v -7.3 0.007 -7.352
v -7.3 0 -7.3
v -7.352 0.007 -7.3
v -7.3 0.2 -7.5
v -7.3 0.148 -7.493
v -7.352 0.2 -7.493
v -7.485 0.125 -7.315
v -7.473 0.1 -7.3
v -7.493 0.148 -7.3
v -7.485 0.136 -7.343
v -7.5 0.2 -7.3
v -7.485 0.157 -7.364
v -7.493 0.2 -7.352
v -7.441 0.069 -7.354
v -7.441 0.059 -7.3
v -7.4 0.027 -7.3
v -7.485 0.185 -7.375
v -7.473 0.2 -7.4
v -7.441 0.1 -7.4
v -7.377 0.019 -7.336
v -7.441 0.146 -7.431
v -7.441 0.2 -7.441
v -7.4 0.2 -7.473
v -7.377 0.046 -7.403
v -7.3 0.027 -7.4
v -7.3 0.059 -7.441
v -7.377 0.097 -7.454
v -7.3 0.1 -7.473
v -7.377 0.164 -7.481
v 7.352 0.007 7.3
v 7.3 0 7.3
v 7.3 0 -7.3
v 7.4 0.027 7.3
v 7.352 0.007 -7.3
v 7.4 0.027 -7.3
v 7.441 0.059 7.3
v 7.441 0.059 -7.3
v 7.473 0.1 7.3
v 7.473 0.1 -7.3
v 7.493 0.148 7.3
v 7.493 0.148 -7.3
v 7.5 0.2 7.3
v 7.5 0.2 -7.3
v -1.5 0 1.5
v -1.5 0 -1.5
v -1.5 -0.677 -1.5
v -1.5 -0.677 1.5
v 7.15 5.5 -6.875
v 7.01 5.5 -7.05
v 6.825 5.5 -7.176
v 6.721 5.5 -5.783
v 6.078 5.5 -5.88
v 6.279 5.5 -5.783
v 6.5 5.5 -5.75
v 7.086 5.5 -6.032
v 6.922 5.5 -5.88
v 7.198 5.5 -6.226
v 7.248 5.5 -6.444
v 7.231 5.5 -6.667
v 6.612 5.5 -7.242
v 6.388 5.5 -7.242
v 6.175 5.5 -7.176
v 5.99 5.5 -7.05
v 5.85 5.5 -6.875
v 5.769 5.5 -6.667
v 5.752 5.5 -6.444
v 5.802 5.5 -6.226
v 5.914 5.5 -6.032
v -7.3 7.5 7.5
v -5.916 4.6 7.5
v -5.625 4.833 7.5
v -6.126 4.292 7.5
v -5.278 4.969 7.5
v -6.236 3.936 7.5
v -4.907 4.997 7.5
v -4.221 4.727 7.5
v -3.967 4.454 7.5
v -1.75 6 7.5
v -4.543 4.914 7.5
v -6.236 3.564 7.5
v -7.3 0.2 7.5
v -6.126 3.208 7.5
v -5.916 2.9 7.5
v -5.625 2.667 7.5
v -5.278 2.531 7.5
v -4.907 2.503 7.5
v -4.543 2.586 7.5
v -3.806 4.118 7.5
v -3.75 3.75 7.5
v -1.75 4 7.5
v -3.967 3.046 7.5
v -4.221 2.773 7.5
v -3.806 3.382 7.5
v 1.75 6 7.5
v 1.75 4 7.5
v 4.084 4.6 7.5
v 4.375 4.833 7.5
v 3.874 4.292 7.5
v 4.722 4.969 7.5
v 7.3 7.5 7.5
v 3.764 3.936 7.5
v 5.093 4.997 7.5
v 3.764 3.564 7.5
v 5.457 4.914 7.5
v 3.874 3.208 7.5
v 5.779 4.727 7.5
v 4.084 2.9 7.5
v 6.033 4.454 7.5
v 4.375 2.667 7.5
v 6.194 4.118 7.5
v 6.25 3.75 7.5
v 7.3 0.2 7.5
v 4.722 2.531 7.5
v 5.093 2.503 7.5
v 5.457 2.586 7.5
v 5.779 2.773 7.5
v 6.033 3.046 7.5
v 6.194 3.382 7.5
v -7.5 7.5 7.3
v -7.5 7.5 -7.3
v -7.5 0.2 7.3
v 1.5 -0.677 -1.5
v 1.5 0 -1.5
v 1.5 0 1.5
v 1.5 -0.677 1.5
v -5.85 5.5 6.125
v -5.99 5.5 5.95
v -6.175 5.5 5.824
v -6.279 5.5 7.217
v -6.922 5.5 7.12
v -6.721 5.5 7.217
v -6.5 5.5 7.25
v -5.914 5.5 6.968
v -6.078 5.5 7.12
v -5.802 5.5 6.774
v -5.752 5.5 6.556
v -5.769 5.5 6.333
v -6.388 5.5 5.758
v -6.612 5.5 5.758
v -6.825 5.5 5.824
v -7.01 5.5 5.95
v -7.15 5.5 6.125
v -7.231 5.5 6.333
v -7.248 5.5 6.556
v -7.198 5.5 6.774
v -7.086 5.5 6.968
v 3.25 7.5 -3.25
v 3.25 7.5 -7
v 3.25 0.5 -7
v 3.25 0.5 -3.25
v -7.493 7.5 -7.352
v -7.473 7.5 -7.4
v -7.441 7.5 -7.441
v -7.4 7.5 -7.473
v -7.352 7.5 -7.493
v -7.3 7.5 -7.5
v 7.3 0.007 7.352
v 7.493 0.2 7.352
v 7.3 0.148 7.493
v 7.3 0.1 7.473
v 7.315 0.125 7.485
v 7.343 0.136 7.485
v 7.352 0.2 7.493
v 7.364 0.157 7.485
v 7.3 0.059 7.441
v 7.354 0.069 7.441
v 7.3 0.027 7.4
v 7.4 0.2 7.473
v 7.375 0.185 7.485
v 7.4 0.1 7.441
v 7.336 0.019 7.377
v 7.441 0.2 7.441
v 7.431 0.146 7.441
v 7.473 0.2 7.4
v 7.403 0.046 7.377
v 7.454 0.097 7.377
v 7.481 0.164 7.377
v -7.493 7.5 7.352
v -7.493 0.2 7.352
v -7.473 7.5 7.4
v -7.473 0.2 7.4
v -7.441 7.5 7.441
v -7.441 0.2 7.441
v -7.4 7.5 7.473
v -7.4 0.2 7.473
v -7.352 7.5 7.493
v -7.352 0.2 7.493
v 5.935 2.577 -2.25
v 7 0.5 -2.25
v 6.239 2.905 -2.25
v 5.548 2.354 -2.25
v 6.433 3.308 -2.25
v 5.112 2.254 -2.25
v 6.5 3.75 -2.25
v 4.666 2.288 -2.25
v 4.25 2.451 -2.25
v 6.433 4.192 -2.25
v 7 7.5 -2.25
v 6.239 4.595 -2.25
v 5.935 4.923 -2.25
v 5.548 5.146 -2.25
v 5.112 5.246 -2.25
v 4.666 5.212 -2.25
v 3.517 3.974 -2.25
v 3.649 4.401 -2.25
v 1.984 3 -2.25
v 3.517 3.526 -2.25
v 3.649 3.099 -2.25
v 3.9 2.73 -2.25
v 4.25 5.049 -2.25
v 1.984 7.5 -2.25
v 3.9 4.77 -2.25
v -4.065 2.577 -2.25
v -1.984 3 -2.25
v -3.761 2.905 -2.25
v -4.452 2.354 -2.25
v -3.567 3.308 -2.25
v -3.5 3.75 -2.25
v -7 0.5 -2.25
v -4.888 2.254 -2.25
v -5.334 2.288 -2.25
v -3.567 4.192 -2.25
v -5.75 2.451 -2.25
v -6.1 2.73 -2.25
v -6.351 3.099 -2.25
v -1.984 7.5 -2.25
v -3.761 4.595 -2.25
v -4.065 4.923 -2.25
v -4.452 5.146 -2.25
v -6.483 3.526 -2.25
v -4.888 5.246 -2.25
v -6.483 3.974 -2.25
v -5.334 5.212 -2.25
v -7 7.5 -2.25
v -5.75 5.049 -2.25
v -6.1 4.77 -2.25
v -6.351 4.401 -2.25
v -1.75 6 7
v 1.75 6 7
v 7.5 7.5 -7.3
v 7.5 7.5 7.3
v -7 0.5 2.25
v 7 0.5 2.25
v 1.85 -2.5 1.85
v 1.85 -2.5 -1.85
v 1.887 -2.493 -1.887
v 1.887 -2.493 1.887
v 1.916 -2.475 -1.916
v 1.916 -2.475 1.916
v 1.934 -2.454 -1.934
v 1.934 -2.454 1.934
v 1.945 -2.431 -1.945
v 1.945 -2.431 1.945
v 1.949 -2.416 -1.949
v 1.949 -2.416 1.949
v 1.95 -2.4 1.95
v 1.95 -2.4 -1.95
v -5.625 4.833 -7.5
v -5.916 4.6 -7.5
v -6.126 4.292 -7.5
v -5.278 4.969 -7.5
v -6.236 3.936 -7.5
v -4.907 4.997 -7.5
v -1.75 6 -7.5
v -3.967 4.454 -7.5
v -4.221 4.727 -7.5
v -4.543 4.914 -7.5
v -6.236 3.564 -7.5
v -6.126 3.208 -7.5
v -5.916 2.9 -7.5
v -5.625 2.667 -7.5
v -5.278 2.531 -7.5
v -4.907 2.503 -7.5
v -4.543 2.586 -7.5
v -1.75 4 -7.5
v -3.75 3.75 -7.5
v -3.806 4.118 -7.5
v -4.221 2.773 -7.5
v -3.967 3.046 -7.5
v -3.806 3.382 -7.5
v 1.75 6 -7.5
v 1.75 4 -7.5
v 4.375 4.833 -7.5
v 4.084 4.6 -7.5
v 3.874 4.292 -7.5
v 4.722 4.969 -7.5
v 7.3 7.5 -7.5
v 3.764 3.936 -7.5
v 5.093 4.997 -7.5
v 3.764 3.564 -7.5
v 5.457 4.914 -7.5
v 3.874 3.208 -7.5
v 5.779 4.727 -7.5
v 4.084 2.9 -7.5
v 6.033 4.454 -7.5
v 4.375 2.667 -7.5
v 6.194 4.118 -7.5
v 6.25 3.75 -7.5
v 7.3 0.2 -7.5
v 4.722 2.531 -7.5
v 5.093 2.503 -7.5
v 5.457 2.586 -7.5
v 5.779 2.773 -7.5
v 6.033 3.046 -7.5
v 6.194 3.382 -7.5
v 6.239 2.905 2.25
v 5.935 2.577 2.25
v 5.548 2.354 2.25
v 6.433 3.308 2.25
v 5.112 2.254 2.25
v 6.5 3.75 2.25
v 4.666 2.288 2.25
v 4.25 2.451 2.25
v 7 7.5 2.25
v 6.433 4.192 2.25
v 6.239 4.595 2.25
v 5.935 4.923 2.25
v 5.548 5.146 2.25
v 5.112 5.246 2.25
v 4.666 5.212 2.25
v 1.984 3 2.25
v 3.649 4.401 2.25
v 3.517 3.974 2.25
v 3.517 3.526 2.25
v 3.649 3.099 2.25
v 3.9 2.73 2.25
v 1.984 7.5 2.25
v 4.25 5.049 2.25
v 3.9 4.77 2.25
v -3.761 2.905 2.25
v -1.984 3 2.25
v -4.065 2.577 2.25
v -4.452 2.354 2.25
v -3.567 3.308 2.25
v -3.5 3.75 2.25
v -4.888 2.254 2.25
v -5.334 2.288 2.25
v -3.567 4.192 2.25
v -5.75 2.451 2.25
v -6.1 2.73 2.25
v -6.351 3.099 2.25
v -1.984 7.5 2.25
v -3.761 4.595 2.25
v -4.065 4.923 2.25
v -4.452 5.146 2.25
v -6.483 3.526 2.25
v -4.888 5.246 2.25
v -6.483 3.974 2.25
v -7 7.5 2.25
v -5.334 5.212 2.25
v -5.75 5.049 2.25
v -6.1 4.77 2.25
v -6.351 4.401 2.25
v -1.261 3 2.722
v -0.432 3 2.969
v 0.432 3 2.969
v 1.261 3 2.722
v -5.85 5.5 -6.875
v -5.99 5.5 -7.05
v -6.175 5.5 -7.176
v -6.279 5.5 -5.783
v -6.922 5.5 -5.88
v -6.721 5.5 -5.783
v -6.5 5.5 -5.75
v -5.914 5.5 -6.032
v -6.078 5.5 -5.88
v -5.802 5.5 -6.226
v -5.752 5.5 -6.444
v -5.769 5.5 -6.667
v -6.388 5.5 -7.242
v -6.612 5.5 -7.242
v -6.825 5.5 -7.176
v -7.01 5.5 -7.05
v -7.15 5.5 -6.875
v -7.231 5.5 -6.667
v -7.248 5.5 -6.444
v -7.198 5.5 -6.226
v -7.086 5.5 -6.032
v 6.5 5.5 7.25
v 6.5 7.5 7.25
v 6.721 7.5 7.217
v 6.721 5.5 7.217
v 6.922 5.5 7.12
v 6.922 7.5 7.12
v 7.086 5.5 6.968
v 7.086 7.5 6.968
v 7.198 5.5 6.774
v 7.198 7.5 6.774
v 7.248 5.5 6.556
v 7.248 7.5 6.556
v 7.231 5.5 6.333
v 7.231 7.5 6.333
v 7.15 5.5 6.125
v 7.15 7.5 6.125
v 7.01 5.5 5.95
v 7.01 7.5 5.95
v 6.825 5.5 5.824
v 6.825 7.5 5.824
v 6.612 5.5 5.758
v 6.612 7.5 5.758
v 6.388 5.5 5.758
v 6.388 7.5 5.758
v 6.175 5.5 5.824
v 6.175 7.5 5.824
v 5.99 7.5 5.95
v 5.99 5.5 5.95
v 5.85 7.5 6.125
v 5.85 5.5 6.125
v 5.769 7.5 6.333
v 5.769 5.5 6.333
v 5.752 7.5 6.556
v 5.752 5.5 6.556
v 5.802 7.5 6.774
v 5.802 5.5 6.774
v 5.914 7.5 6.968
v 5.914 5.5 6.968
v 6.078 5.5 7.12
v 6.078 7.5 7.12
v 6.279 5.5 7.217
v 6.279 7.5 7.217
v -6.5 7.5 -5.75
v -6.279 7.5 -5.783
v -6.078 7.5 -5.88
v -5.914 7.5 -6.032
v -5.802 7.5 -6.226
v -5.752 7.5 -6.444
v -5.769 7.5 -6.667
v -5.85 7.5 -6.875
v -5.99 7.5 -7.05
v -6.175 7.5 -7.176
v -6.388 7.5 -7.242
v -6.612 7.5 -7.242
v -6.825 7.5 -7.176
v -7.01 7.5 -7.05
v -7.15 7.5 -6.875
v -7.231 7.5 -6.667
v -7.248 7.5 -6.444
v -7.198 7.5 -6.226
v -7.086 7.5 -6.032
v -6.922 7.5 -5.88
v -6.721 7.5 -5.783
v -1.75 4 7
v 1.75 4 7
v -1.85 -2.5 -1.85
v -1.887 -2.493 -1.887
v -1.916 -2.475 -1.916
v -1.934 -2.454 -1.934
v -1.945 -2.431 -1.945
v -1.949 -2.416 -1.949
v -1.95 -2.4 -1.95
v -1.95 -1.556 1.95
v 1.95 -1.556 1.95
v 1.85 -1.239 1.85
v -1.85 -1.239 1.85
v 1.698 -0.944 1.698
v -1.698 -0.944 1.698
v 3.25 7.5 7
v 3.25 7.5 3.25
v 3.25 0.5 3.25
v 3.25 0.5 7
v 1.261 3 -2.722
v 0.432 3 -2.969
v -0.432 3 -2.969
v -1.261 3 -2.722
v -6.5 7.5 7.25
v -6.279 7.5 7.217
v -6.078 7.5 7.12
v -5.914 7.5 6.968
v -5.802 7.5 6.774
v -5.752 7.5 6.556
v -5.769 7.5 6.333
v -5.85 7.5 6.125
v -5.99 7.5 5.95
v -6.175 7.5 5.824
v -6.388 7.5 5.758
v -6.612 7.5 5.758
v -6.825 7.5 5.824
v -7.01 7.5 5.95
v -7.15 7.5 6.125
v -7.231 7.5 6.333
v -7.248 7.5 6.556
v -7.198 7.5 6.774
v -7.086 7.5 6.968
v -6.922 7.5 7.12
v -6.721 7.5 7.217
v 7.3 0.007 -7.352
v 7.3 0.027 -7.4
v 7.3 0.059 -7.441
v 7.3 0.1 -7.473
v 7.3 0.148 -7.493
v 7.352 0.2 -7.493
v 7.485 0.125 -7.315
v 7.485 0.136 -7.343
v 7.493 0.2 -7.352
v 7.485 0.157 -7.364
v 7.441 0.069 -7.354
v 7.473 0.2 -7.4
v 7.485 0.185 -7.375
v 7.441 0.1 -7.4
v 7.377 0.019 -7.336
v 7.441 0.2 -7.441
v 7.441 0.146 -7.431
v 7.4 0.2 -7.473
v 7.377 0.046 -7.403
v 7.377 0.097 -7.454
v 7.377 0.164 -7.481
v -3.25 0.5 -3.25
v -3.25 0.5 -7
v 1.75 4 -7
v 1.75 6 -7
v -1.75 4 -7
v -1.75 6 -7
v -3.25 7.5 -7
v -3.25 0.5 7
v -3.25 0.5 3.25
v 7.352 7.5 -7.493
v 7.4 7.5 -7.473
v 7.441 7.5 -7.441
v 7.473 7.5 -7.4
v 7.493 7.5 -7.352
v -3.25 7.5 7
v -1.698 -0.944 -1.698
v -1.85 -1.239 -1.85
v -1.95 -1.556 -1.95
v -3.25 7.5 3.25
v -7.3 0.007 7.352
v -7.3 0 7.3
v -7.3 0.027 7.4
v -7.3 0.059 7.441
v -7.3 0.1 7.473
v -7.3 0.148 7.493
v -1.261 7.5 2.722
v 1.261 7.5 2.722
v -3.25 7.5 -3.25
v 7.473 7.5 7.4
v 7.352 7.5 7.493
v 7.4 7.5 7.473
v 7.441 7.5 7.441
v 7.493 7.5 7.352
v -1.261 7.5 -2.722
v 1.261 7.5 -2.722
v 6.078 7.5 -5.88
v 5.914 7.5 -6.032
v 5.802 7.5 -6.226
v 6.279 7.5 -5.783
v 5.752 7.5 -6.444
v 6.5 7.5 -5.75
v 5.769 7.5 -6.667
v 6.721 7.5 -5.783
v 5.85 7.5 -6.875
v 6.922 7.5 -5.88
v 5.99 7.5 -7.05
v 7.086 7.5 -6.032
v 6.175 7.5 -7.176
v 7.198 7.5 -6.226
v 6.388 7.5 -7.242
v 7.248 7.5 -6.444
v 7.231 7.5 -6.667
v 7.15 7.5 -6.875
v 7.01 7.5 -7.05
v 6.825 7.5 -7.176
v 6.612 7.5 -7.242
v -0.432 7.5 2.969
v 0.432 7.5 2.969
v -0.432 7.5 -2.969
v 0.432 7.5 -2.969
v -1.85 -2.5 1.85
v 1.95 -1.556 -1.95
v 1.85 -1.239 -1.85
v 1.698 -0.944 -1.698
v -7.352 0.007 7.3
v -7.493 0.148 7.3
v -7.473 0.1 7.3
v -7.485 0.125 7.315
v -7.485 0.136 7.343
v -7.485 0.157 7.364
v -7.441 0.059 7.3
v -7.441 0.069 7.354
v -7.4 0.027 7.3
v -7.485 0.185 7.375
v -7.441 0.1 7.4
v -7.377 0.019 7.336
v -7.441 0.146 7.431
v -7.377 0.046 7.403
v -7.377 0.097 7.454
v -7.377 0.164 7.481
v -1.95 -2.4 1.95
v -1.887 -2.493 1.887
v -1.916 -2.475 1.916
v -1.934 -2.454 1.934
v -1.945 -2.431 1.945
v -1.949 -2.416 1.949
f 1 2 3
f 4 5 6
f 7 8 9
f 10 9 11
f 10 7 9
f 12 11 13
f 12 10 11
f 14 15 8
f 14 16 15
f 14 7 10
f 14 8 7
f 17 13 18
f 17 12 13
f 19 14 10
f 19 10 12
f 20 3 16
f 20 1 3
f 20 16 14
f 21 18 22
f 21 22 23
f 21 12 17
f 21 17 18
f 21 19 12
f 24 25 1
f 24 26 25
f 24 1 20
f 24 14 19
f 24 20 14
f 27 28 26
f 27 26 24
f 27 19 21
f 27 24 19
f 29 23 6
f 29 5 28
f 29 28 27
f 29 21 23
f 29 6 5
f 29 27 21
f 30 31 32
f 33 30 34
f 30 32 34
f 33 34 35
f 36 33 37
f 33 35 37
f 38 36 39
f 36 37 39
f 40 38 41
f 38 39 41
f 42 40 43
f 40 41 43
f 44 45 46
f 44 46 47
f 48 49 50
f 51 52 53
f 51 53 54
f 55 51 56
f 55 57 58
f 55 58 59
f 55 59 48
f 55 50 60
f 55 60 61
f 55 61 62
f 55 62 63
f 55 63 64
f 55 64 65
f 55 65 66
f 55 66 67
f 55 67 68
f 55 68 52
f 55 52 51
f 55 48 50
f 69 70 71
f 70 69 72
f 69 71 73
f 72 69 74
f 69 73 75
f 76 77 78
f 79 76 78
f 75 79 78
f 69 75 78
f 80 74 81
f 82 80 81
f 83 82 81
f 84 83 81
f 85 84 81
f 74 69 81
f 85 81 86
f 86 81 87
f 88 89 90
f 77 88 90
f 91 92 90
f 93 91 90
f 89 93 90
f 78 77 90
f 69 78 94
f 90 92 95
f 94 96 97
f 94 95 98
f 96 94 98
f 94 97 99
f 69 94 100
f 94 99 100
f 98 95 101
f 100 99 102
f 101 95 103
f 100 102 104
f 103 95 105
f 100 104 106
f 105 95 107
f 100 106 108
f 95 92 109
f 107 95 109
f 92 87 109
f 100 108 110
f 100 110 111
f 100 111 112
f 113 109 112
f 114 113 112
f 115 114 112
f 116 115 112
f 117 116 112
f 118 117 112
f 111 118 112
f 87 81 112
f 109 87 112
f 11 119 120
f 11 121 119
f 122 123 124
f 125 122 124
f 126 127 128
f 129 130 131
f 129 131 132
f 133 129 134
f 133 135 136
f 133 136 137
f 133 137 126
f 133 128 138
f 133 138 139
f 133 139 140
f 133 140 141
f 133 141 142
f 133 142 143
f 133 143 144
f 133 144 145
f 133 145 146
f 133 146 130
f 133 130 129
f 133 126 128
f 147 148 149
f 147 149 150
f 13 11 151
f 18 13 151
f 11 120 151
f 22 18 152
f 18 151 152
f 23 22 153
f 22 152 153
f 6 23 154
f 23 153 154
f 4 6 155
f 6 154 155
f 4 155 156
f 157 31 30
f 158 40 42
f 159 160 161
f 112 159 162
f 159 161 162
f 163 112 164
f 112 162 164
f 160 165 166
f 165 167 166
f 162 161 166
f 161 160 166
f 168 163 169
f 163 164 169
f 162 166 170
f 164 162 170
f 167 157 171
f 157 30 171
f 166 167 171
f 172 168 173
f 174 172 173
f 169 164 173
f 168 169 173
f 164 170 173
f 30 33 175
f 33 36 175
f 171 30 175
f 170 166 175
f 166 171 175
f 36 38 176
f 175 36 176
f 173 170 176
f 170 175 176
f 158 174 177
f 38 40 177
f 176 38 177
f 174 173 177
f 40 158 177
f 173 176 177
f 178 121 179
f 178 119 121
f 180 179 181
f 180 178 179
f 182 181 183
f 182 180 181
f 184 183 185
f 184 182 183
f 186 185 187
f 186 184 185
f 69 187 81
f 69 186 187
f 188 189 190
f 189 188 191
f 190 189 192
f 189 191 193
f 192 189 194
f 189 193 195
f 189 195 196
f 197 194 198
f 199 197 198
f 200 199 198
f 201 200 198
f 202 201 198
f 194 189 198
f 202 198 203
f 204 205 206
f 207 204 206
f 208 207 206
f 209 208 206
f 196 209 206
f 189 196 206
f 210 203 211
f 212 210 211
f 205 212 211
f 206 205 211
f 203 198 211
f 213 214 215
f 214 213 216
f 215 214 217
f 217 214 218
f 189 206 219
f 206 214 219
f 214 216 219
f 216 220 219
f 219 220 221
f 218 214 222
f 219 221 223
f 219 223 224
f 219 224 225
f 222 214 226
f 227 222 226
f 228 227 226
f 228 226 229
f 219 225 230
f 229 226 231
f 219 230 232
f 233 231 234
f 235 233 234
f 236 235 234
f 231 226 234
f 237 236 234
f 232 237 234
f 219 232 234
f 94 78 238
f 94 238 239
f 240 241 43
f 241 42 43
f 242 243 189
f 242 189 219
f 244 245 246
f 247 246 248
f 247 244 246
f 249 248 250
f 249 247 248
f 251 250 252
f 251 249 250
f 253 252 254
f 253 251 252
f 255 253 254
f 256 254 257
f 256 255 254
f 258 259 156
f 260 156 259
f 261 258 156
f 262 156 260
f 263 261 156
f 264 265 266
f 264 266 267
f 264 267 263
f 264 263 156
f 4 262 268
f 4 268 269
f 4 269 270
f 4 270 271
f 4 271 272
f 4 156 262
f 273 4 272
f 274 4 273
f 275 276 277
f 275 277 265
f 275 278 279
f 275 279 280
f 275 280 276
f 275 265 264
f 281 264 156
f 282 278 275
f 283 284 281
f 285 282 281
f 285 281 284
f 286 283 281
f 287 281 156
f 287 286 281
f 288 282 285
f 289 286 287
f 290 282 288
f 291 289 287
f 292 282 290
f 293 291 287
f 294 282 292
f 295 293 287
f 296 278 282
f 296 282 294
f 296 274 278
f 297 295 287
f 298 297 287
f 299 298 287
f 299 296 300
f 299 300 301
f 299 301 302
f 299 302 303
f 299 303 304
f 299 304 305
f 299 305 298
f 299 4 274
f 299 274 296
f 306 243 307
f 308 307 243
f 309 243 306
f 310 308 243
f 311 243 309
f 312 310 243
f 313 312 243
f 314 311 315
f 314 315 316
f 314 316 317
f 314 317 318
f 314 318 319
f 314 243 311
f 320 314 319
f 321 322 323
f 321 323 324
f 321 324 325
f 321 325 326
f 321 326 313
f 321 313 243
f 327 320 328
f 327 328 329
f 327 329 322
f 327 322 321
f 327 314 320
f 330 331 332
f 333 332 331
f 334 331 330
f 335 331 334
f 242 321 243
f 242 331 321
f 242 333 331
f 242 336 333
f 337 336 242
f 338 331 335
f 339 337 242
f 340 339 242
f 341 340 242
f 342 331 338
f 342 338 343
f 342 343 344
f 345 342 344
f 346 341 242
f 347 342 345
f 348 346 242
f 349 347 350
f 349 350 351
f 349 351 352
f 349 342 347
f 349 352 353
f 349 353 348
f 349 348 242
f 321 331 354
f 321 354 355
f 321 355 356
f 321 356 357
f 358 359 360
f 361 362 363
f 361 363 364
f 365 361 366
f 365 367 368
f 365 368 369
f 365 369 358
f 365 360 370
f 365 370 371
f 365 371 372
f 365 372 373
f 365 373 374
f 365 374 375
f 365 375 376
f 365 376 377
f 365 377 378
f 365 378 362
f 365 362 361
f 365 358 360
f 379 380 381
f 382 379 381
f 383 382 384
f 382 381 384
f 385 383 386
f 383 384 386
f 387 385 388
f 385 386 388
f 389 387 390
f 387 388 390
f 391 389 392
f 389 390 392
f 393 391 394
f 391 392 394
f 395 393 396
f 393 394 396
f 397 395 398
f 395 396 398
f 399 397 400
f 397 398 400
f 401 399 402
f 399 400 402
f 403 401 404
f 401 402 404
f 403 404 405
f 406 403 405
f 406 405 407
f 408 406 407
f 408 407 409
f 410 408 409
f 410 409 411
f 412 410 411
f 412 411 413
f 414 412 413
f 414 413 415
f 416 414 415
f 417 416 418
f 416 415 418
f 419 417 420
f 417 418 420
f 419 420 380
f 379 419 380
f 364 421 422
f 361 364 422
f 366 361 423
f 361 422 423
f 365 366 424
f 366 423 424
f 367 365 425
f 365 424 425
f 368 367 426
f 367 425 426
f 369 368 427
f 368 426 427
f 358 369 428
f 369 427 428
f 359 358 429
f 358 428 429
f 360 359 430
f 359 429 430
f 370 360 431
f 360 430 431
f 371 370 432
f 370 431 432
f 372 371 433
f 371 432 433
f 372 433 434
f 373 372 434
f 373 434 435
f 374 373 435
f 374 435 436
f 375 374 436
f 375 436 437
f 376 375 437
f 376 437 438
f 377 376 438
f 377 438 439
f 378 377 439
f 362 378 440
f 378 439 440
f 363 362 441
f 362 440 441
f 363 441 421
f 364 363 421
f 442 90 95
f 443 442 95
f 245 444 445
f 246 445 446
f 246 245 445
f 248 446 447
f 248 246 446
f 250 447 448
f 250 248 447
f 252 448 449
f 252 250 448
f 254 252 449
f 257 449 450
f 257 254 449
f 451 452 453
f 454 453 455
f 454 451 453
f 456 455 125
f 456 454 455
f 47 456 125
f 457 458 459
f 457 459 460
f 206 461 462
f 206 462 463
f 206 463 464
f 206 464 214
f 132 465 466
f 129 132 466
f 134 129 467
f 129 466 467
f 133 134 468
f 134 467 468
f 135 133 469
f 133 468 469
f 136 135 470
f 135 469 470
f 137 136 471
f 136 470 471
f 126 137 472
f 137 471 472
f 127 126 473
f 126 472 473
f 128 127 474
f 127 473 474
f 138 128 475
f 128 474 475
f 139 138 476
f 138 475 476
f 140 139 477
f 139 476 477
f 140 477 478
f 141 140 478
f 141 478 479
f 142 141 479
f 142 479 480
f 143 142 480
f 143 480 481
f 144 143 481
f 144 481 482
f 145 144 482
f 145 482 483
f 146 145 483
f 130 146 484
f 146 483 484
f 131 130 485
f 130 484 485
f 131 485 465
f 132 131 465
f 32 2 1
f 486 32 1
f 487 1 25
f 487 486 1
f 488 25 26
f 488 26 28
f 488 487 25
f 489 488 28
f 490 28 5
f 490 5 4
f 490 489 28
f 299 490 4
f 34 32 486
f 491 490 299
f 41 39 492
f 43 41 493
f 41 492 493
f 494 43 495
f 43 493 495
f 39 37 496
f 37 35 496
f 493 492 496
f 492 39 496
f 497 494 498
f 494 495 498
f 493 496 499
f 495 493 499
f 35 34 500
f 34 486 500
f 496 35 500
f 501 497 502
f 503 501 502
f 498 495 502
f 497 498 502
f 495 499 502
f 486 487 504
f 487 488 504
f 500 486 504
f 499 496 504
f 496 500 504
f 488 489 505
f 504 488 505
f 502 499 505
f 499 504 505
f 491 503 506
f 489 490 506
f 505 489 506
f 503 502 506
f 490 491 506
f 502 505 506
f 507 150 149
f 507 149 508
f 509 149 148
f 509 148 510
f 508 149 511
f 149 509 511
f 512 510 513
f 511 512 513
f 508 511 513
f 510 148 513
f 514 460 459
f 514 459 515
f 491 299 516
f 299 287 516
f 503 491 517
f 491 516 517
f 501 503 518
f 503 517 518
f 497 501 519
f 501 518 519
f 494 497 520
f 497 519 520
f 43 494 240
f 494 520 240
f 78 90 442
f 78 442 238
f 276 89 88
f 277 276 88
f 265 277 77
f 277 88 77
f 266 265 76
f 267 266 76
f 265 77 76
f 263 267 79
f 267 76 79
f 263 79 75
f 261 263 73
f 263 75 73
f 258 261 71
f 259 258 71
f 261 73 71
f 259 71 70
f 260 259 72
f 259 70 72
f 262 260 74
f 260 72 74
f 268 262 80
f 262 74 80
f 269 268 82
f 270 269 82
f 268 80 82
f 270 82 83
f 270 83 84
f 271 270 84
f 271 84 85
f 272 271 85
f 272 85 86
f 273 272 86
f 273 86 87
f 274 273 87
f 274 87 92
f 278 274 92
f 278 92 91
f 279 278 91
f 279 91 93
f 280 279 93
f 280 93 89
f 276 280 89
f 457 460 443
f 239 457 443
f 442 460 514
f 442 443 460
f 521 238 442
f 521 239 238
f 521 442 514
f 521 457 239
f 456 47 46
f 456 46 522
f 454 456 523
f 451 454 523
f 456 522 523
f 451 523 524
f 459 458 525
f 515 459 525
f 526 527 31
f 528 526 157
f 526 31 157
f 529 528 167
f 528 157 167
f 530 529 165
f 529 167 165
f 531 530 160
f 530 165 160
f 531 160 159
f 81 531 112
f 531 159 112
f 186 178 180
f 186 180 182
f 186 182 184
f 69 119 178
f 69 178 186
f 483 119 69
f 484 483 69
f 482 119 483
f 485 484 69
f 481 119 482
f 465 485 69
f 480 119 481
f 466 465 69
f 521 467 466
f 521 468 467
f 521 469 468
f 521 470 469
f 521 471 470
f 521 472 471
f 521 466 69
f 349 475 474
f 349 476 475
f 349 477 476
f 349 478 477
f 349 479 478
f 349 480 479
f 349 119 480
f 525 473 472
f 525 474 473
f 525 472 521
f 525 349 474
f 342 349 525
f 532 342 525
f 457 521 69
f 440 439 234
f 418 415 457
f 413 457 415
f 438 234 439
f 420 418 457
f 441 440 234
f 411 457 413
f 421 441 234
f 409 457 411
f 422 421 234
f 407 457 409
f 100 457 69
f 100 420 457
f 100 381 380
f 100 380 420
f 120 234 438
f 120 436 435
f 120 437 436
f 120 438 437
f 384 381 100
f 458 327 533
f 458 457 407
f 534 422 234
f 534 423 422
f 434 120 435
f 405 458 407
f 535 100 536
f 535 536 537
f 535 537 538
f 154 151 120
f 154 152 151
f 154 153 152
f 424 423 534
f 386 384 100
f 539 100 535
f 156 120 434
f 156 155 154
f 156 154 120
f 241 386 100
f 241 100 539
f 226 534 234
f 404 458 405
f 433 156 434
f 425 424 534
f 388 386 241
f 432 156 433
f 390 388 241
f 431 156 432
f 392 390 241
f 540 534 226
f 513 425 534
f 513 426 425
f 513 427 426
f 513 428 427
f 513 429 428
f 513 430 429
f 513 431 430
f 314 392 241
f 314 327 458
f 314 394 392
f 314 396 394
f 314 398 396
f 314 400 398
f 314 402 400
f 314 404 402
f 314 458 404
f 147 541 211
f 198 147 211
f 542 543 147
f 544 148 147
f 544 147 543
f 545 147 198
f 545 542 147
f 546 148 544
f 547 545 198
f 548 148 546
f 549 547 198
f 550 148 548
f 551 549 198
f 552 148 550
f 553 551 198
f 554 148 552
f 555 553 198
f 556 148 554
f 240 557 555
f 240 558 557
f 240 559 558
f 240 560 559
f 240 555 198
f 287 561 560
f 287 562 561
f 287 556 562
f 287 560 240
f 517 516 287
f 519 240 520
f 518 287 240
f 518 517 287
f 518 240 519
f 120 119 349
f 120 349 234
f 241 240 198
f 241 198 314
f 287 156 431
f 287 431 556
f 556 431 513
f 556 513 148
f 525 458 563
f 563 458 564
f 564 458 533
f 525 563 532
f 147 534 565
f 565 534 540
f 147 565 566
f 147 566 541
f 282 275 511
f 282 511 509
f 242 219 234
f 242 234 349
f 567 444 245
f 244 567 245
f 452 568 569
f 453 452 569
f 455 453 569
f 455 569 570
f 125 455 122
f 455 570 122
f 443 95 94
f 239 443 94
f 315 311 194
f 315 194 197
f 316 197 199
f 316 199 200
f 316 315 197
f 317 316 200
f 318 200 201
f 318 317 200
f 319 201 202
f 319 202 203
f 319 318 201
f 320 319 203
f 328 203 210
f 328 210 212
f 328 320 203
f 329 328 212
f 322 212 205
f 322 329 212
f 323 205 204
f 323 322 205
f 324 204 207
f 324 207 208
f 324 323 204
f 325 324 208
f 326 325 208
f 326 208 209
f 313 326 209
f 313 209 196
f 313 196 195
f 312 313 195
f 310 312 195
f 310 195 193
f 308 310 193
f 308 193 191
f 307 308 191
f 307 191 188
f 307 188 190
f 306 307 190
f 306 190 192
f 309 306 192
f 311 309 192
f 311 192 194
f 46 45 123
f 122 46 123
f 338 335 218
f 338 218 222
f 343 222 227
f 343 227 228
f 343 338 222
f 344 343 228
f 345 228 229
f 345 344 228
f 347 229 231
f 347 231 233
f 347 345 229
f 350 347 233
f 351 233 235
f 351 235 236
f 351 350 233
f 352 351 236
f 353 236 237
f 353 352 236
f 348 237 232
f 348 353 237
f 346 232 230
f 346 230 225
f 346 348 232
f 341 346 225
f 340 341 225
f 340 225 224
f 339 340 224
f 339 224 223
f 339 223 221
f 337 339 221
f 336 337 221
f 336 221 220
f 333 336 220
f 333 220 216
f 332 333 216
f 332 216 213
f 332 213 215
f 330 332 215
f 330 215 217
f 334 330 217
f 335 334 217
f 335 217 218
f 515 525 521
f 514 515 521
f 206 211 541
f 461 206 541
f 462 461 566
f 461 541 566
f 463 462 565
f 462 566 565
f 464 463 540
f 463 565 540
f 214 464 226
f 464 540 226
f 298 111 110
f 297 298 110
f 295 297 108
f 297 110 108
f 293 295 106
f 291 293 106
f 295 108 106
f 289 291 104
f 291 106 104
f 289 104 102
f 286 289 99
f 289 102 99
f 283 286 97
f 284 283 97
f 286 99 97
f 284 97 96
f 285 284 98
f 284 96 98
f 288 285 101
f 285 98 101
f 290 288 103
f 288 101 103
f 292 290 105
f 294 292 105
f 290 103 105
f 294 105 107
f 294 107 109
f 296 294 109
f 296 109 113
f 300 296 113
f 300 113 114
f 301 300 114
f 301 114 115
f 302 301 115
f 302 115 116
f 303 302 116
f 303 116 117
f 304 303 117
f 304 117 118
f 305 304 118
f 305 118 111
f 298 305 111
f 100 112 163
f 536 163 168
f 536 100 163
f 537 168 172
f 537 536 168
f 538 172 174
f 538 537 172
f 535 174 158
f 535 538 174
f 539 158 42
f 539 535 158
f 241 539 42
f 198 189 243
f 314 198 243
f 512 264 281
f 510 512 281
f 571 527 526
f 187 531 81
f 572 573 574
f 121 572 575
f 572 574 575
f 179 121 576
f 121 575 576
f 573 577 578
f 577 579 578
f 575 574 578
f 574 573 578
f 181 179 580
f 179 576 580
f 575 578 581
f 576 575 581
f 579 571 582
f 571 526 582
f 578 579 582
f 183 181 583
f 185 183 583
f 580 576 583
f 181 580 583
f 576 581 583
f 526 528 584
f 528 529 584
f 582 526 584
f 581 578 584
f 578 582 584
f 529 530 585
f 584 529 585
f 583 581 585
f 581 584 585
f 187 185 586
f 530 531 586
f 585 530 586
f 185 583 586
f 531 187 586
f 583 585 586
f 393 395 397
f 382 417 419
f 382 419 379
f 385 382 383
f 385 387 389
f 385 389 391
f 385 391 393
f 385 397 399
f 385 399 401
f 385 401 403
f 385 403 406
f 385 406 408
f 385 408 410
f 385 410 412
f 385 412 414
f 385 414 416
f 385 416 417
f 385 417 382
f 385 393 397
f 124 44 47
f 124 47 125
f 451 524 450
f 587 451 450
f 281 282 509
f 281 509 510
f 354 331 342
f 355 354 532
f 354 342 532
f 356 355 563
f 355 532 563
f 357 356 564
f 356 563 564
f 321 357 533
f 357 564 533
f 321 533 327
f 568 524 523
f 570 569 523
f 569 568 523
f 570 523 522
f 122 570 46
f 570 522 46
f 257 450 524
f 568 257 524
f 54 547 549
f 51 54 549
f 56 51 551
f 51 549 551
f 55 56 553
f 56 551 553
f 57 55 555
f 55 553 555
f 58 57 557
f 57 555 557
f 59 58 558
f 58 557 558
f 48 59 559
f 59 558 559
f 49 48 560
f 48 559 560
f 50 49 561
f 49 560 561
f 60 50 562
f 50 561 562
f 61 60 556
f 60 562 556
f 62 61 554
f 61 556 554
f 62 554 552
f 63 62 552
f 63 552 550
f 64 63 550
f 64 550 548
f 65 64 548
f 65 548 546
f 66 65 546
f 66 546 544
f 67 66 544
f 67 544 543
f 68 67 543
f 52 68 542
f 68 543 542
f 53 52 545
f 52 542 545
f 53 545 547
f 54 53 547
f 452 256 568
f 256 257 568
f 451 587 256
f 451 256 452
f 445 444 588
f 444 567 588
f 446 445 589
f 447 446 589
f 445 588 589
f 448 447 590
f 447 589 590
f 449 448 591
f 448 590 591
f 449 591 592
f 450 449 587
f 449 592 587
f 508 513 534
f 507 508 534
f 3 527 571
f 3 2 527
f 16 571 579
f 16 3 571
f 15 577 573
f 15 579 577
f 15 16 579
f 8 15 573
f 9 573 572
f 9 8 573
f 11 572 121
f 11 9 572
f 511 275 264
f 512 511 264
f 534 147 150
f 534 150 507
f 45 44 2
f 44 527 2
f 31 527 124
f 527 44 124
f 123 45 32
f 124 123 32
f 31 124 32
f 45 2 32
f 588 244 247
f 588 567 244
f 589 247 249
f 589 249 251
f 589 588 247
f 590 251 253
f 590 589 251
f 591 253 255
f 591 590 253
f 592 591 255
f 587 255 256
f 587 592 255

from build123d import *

# Parameters (mm, degrees)
SKETCH_2_W                      = 15
SKETCH_2_H                      = 15
EXTRUDE_1_DEPTH                 = 7.5
SKETCH_3_W                      = 14
SKETCH_3_H                      = 4.5
CUT_EXTRUDE_1_DEPTH             = 7
SKETCH_4_R                      = 3
CUT_EXTRUDE_2_DEPTH             = 4.5
SKETCH_5_W                      = 6.5
SKETCH_5_H                      = 3.75
CUT_EXTRUDE_3_DEPTH             = 7
EXTRUDE_2_REACH                 = 20.371
SKETCH_6_R                      = 1.5
SKETCH_7_R                      = 1.25
CUT_EXTRUDE_4_DEPTH             = 19.371173071
SKETCH_8_W                      = 3
SKETCH_8_H                      = 3
EXTRUDE_3_DEPTH                 = 1
CUT_EXTRUDE_5_REACH             = 20.371
SKETCH_9_W                      = 3.5
SKETCH_9_H                      = 2
CUT_EXTRUDE_6_REACH             = 35.371
CUT_EXTRUDE_START               = -15
SKETCH_9_2_W                    = 3.5
SKETCH_9_2_H                    = 2
EXTRUDE_4_DEPTH                 = 2
EXTRUDE_4_DEPTH_BACK            = 2
CUT_EXTRUDE_7_REACH             = 14.99
CUT_EXTRUDE_7_DIRECTION_2_REACH = 14.99
FILLET_1_R                      = 0.1
FILLET_2_R                      = 0.2
SKETCH_12_R                     = 0.75
CUT_EXTRUDE_8_DEPTH             = 2


with BuildPart() as part:
    # 草图2 → 凸台-拉伸1 (new body)
    with BuildSketch(Plane(origin=(0, 0, 0), x_dir=(1, 0, 0), z_dir=(0, 1, 0))):
        Rectangle(SKETCH_2_W, SKETCH_2_H)
    extrude(amount=EXTRUDE_1_DEPTH)

    # 草图3 → 切除-拉伸1 (cut)
    with BuildSketch(Plane(origin=(0, 7.5, 0), x_dir=(-1, 0, 0), z_dir=(0, 1, 0))):
        Rectangle(SKETCH_3_W, SKETCH_3_H)
    extrude(amount=-CUT_EXTRUDE_1_DEPTH, mode=Mode.SUBTRACT)

    # 草图4 → 切除-拉伸2 (cut)
    with BuildSketch(Plane(origin=(0, 7.5, 0), x_dir=(1, 0, 0), z_dir=(0, 1, 0))):
        Circle(SKETCH_4_R)
    extrude(amount=-CUT_EXTRUDE_2_DEPTH, mode=Mode.SUBTRACT)

    # 草图5 → 切除-拉伸3 (cut)
    with BuildSketch(Plane(origin=(0, 7.5, 0), x_dir=(-1, 0, 0), z_dir=(0, 1, 0))):
        with Locations((0, -5.125)):
            Rectangle(SKETCH_5_W, SKETCH_5_H)
        with Locations((0, 5.125)):
            Rectangle(SKETCH_5_W, SKETCH_5_H)
    extrude(amount=-CUT_EXTRUDE_3_DEPTH, mode=Mode.SUBTRACT)

    # 草图6 → 凸台-拉伸2 (add, up to next)
    with BuildSketch(Plane.XY.offset(7.5), mode=Mode.PRIVATE) as extrude_2_sk1:
        with Locations((-5, 3.75)):
            Circle(SKETCH_6_R)
    extrude_2_tool1 = extrude(extrude_2_sk1.sketch, amount=-EXTRUDE_2_REACH, mode=Mode.PRIVATE) - part.part
    # 草图6 → 凸台-拉伸2 (add, up to next)
    with BuildSketch(Plane.XY.offset(7.5), mode=Mode.PRIVATE) as extrude_2_sk2:
        with Locations((5, 3.75)):
            Circle(SKETCH_6_R)
    extrude_2_tool2 = extrude(extrude_2_sk2.sketch, amount=-EXTRUDE_2_REACH, mode=Mode.PRIVATE) - part.part
    add(extrude_2_tool1.solids().sort_by_distance((-5, 3.75, 7.5))[0])
    add(extrude_2_tool2.solids().sort_by_distance((5, 3.75, 7.5))[0])

    # 草图7 → 切除-拉伸4 (cut, through all)
    with BuildSketch(Plane.XY.offset(7.5)):
        with Locations((-5, 3.75)):
            Circle(SKETCH_7_R)
        with Locations((5, 3.75)):
            Circle(SKETCH_7_R)
    extrude(amount=-CUT_EXTRUDE_4_DEPTH, mode=Mode.SUBTRACT)

    # 草图8 → 凸台-拉伸3 (add)
    with BuildSketch(Plane.XZ):
        Rectangle(SKETCH_8_W, SKETCH_8_H)
    extrude(amount=EXTRUDE_3_DEPTH)

    # 草图9 → 切除-拉伸5 (cut, up to next)
    with BuildSketch(Plane.XY.offset(7.5), mode=Mode.PRIVATE) as cut_extrude_5_sk1:
        with Locations((0, 5)):
            Rectangle(SKETCH_9_W, SKETCH_9_H)
    cut_extrude_5_tool1 = extrude(cut_extrude_5_sk1.sketch, amount=-CUT_EXTRUDE_5_REACH, mode=Mode.PRIVATE) & part.part
    add(cut_extrude_5_tool1.solids().sort_by_distance((0, 5, 7.5))[0], mode=Mode.SUBTRACT)

    # 草图9<2> → 切除-拉伸6 (cut, up to next)
    with BuildSketch(Plane.XY.offset(7.5).offset(CUT_EXTRUDE_START), mode=Mode.PRIVATE) as cut_extrude_6_sk1:
        with Locations((0, 5)):
            Rectangle(SKETCH_9_2_W, SKETCH_9_2_H)
    cut_extrude_6_tool1 = extrude(cut_extrude_6_sk1.sketch, amount=CUT_EXTRUDE_6_REACH, mode=Mode.PRIVATE) & part.part
    add(cut_extrude_6_tool1.solids().sort_by_distance((0, 5, -7.5))[0], mode=Mode.SUBTRACT)

    # 草图10 → 凸台-拉伸4 (add, two sides: drawn at the far end of the back side and taken through both)
    with BuildSketch(Plane.XY.offset(-EXTRUDE_4_DEPTH_BACK)):
        with BuildLine():
            Line((-1.95, -2.5), (1.95, -2.5))
            Line((1.95, -2.5), (1.95, -1.555590279))
            ThreePointArc((1.95, -1.555590279), (1.780042303, -1.088161527), (1.5, -0.677124344))
            Line((1.5, -0.677124344), (-1.5, -0.677124344))
            ThreePointArc((-1.5, -0.677124344), (-1.780042303, -1.088161527), (-1.95, -1.555590279))
            Line((-1.95, -1.555590279), (-1.95, -2.5))
        make_face()
    extrude(amount=EXTRUDE_4_DEPTH + EXTRUDE_4_DEPTH_BACK)

    # 草图11 → 切除-拉伸7 (cut, up to next)
    with BuildSketch(Plane(origin=(0, 0, 0), x_dir=(0, 0, -1), z_dir=(1, 0, 0)), mode=Mode.PRIVATE) as cut_extrude_7_sk1:
        with BuildLine():
            Line((1.95, -2.5), (1.95, -1.555590279))
            ThreePointArc((1.95, -1.555590279), (1.780042303, -1.088161527), (1.5, -0.677124344))
            Line((1.5, -0.677124344), (2, -0.677124344))
            Line((2, -0.677124344), (2, -2.5))
            Line((2, -2.5), (1.95, -2.5))
        make_face()
    cut_extrude_7_tool1 = extrude(cut_extrude_7_sk1.sketch, amount=-CUT_EXTRUDE_7_REACH, mode=Mode.PRIVATE) & part.part
    # 草图11 → 切除-拉伸7 (cut, up to next)
    with BuildSketch(Plane(origin=(0, 0, 0), x_dir=(0, 0, -1), z_dir=(1, 0, 0)), mode=Mode.PRIVATE) as cut_extrude_7_sk2:
        with BuildLine():
            Line((-1.95, -2.5), (-1.95, -1.555590279))
            ThreePointArc((-1.95, -1.555590279), (-1.780042303, -1.088161527), (-1.5, -0.677124344))
            Line((-1.5, -0.677124344), (-2, -0.677124344))
            Line((-2, -0.677124344), (-2, -2.5))
            Line((-2, -2.5), (-1.95, -2.5))
        make_face()
    cut_extrude_7_tool2 = extrude(cut_extrude_7_sk2.sketch, amount=-CUT_EXTRUDE_7_REACH, mode=Mode.PRIVATE) & part.part
    add(cut_extrude_7_tool1.solids().sort_by_distance((0, -1.175075, -1.873038))[0], mode=Mode.SUBTRACT)
    add(cut_extrude_7_tool2.solids().sort_by_distance((0, -1.175075, 1.873038))[0], mode=Mode.SUBTRACT)

    # 草图11 → 切除-拉伸7 direction 2 (cut, up to next)
    with BuildSketch(Plane(origin=(0, 0, 0), x_dir=(0, 0, -1), z_dir=(1, 0, 0)), mode=Mode.PRIVATE) as cut_extrude_7_direction_2_sk1:
        with BuildLine():
            Line((1.95, -2.5), (1.95, -1.555590279))
            ThreePointArc((1.95, -1.555590279), (1.780042303, -1.088161527), (1.5, -0.677124344))
            Line((1.5, -0.677124344), (2, -0.677124344))
            Line((2, -0.677124344), (2, -2.5))
            Line((2, -2.5), (1.95, -2.5))
        make_face()
    cut_extrude_7_direction_2_tool1 = extrude(cut_extrude_7_direction_2_sk1.sketch, amount=CUT_EXTRUDE_7_DIRECTION_2_REACH, mode=Mode.PRIVATE) & part.part
    # 草图11 → 切除-拉伸7 direction 2 (cut, up to next)
    with BuildSketch(Plane(origin=(0, 0, 0), x_dir=(0, 0, -1), z_dir=(1, 0, 0)), mode=Mode.PRIVATE) as cut_extrude_7_direction_2_sk2:
        with BuildLine():
            Line((-1.95, -2.5), (-1.95, -1.555590279))
            ThreePointArc((-1.95, -1.555590279), (-1.780042303, -1.088161527), (-1.5, -0.677124344))
            Line((-1.5, -0.677124344), (-2, -0.677124344))
            Line((-2, -0.677124344), (-2, -2.5))
            Line((-2, -2.5), (-1.95, -2.5))
        make_face()
    cut_extrude_7_direction_2_tool2 = extrude(cut_extrude_7_direction_2_sk2.sketch, amount=CUT_EXTRUDE_7_DIRECTION_2_REACH, mode=Mode.PRIVATE) & part.part
    add(cut_extrude_7_direction_2_tool1.solids().sort_by_distance((0, -1.175075, -1.873038))[0], mode=Mode.SUBTRACT)
    add(cut_extrude_7_direction_2_tool2.solids().sort_by_distance((0, -1.175075, 1.873038))[0], mode=Mode.SUBTRACT)

    # 圆角1
    fillet_1_edges = [part.edges().sort_by_distance(p)[0] for p in [
        (0, -2.5, -1.95),
        (-1.95, -2.5, 0),
        (0, -2.5, 1.95),
        (1.95, -2.5, 0),
    ]]
    fillet(fillet_1_edges, radius=FILLET_1_R)

    # 圆角2
    fillet_2_edges = [part.edges().sort_by_distance(p)[0] for p in [
        (-7.5, 3.75, -7.5),
        (7.5, 3.75, -7.5),
        (-7.5, 3.75, 7.5),
        (-7.5, 0, 0),
        (0, 0, -7.5),
        (7.5, 0, 0),
        (0, 0, 7.5),
        (7.5, 3.75, 7.5),
    ]]
    fillet(fillet_2_edges, radius=FILLET_2_R)

    # 草图12 → 切除-拉伸8 (cut)
    with BuildSketch(Plane(origin=(0, 7.5, 0), x_dir=(-1, 0, 0), z_dir=(0, 1, 0))):
        with Locations((6.5, -6.5)):
            Circle(SKETCH_12_R)
        with Locations((-6.5, 6.5)):
            Circle(SKETCH_12_R)
        with Locations((6.5, 6.5)):
            Circle(SKETCH_12_R)
        with Locations((-6.5, -6.5)):
            Circle(SKETCH_12_R)
    extrude(amount=-CUT_EXTRUDE_8_DEPTH, mode=Mode.SUBTRACT)


solid = part.part
